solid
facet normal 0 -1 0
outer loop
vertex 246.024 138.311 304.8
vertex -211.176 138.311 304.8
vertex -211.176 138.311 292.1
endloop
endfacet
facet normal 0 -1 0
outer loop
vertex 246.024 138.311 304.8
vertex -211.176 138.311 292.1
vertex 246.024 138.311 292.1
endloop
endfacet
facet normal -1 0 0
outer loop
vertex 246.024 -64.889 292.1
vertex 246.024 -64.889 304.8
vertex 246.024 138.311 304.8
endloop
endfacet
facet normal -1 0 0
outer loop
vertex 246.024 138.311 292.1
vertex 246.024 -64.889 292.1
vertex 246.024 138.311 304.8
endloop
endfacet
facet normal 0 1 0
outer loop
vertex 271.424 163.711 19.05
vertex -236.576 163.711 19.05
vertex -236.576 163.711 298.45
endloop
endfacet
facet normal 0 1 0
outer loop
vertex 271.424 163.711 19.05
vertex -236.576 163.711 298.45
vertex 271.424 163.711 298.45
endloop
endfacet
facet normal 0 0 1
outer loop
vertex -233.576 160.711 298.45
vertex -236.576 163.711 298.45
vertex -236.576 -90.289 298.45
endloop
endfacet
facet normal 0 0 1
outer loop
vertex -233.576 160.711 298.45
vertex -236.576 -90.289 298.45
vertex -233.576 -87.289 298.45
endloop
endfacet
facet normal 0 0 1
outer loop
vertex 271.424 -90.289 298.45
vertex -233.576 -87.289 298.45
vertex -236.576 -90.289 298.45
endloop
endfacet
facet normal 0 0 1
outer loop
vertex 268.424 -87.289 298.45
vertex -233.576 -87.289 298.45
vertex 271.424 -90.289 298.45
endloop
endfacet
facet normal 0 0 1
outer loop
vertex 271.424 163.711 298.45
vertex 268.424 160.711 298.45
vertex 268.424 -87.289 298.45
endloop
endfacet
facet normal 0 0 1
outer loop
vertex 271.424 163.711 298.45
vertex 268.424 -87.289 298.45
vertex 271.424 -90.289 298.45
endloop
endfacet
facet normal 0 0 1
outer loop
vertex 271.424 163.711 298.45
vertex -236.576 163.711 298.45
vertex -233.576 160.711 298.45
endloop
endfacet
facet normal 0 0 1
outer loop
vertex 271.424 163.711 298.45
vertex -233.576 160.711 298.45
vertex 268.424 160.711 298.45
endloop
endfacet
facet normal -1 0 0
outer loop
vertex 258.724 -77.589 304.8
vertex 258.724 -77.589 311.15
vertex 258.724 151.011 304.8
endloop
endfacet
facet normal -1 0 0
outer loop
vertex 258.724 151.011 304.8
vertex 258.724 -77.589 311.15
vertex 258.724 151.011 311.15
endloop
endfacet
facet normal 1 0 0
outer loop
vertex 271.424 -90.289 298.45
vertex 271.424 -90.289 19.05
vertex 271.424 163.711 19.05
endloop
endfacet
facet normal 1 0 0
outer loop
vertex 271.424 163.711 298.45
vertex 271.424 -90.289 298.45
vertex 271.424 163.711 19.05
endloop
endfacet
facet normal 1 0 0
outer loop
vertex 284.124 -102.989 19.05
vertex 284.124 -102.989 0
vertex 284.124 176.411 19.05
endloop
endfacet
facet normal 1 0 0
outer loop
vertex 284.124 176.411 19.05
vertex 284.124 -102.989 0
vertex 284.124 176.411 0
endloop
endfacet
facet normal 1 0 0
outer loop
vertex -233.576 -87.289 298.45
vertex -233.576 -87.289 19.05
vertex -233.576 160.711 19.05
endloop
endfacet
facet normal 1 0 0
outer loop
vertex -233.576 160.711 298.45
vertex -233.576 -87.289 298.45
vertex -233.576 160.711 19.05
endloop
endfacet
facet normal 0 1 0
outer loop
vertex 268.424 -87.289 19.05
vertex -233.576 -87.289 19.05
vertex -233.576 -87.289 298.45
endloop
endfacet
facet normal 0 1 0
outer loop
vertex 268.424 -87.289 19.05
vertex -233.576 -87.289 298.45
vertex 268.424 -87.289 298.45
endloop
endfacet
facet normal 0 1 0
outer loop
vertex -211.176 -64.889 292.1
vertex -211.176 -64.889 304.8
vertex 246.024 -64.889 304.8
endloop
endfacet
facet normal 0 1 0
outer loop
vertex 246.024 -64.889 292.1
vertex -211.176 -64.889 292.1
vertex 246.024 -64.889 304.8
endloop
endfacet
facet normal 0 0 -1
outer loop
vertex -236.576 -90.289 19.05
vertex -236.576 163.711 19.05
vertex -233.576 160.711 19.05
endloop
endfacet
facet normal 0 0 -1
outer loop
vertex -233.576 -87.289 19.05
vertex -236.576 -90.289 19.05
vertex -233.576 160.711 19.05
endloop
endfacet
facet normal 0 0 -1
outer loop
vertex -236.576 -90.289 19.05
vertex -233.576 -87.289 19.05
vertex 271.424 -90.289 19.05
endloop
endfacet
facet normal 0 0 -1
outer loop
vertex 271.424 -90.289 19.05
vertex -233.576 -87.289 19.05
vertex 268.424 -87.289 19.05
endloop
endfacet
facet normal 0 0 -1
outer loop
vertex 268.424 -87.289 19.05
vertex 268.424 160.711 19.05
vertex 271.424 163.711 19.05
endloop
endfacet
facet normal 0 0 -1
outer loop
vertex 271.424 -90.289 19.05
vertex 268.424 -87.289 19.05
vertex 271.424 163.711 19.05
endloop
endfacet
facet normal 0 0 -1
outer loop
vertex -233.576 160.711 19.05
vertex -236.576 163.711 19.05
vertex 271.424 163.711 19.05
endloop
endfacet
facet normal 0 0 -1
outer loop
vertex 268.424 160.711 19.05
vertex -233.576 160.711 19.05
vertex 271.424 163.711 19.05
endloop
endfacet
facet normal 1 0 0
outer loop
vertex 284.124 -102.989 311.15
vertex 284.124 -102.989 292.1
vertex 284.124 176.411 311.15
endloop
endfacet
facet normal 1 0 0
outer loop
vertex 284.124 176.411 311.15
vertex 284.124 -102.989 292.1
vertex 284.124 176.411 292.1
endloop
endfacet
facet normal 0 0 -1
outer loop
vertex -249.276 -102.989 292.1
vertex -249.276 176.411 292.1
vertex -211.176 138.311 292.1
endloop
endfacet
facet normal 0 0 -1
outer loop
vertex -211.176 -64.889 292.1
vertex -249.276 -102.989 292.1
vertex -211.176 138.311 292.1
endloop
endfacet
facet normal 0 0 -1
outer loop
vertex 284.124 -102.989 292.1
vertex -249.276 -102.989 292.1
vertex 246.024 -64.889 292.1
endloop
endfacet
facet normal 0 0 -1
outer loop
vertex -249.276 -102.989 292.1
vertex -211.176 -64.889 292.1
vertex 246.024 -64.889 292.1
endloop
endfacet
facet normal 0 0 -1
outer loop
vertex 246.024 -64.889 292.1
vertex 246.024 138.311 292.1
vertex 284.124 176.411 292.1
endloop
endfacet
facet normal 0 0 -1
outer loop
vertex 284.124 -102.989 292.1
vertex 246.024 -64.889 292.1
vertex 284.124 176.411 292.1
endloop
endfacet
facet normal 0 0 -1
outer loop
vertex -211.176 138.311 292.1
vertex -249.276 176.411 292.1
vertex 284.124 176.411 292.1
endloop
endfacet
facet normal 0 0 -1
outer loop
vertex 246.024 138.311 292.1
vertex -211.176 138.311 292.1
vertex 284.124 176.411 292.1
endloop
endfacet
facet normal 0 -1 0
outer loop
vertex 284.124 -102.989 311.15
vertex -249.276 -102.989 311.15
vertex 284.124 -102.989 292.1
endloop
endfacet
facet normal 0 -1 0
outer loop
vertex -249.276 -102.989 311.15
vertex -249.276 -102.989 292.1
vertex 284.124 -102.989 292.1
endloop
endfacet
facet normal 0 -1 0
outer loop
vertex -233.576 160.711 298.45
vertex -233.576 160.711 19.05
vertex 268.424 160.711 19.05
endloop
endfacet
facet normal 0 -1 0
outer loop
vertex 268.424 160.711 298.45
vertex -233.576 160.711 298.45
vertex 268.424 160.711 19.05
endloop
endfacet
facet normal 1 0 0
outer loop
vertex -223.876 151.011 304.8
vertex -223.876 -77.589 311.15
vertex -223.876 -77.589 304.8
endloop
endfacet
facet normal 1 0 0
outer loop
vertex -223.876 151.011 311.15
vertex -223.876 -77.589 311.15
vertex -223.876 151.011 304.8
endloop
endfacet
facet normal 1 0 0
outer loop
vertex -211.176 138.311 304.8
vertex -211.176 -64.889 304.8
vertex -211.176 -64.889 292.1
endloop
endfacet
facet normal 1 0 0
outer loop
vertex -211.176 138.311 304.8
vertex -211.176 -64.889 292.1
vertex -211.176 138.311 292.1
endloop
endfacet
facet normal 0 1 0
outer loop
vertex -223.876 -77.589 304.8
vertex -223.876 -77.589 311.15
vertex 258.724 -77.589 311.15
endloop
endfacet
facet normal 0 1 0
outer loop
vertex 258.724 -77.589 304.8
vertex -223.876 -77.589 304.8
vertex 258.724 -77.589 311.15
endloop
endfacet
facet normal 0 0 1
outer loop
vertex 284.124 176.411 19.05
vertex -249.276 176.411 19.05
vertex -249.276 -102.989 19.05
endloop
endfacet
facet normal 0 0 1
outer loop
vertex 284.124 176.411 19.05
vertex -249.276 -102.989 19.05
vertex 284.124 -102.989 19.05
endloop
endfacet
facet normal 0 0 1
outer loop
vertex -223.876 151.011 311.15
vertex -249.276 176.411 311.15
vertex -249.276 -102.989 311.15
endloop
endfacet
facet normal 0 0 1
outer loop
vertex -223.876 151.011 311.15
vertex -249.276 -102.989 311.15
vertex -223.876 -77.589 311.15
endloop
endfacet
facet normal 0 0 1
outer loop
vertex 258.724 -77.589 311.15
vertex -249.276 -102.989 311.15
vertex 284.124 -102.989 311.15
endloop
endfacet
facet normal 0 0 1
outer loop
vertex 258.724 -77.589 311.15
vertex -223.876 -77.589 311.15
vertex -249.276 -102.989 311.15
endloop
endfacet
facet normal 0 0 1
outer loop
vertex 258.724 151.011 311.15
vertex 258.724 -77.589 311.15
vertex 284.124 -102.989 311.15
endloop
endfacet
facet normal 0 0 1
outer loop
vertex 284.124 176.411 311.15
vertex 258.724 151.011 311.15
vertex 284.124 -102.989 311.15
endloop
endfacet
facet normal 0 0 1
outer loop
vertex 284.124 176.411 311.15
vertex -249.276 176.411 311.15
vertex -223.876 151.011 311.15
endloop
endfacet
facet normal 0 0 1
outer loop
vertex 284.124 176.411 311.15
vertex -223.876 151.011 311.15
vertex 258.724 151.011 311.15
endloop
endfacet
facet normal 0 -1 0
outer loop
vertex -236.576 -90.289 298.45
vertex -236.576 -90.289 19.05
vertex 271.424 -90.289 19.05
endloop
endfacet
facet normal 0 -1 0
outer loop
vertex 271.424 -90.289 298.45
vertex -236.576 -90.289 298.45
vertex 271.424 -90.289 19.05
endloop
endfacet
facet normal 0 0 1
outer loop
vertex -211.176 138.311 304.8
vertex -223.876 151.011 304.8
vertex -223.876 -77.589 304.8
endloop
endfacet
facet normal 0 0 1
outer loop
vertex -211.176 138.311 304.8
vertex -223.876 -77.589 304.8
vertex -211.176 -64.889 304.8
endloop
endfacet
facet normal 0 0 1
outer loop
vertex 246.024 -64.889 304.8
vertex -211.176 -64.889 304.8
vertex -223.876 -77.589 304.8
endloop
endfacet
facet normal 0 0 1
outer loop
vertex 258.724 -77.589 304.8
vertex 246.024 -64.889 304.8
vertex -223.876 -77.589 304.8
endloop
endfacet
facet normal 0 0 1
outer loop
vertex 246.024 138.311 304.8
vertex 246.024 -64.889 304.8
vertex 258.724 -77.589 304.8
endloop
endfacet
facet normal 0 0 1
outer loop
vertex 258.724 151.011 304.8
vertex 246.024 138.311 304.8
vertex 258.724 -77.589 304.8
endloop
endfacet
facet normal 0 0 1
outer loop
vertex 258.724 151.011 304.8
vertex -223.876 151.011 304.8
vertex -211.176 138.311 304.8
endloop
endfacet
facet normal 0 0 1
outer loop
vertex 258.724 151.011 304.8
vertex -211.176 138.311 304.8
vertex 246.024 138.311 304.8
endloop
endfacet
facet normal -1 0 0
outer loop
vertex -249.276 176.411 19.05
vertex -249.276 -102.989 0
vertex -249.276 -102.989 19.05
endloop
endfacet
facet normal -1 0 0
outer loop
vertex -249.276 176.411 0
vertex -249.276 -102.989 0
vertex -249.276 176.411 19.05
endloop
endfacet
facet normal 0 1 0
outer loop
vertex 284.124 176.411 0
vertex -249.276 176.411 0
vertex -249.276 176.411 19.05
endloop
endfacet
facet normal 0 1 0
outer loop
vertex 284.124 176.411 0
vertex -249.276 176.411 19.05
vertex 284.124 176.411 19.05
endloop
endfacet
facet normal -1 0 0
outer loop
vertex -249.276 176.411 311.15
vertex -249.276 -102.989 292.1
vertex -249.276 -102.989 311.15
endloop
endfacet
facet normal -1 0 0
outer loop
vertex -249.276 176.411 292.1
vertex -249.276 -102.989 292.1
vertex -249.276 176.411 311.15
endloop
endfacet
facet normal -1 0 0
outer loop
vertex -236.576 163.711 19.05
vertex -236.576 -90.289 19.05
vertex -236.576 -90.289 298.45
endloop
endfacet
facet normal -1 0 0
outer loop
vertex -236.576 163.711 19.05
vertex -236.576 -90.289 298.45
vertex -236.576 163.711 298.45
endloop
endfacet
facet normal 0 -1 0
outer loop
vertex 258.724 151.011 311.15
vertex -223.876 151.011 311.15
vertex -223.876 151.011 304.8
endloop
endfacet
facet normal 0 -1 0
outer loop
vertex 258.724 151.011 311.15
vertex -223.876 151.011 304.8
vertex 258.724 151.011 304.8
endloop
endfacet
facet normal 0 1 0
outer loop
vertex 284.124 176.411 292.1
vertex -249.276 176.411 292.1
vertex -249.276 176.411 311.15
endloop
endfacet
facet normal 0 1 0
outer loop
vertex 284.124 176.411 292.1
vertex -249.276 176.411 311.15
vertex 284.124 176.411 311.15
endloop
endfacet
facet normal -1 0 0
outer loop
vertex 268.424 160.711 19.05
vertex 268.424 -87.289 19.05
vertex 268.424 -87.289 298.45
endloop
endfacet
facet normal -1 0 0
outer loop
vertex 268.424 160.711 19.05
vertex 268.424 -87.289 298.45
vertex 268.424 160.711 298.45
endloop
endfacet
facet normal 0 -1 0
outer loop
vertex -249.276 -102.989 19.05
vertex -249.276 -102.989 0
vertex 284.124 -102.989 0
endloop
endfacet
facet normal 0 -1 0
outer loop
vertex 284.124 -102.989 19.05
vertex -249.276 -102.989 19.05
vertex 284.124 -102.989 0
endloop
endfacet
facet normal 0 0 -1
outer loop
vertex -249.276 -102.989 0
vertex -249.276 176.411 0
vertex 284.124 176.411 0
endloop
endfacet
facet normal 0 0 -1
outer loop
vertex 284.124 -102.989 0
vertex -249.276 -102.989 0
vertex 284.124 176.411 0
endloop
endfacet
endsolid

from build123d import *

# Parameters (mm, degrees)
F0_W      = 533.4
F0_H      = 279.4
F1_DEPTH  = 19.05
F2_W      = 508
F2_H      = 254
F2_W_2    = 502
F2_H_2    = 248
F3_DEPTH  = 279.4
F4_W      = 533.4
F4_H      = 279.4
F5_DEPTH  = 6.35
F6_W      = 533.4
F6_H      = 279.4
F7_DEPTH  = 6.35
F8_W      = 482.6
F8_H      = 228.6
F9_DEPTH  = 6.35
F10_W     = 457.2
F10_H     = 203.2
F11_DEPTH = 25.4


with BuildPart() as f1:
    # F0 (on Top) → F1 (new body)
    with BuildSketch(Plane.XY):
        with Locations((17.4243982553, 36.711462517)):
            Rectangle(F0_W, F0_H)
    extrude(amount=F1_DEPTH)


with BuildPart() as f3:
    # F2 (on face) → F3 (new body)
    with BuildSketch(Plane.XY.offset(19.05)):
        with Locations((17.4243982553, 36.711462517)):
            Rectangle(F2_W, F2_H)
        with Locations((17.4243982553, 36.711462517)):
            Rectangle(F2_W_2, F2_H_2, mode=Mode.SUBTRACT)
    extrude(amount=F3_DEPTH)


with BuildPart() as f5:
    # F4 (on face) → F5 (new body, symmetric)
    with BuildSketch(Plane.XY.offset(298.45)):
        with Locations((17.4243982553, 36.711462517)):
            Rectangle(F4_W, F4_H)
    extrude(amount=F5_DEPTH, both=True)

    # F6 (on face) → F7 (join)
    with BuildSketch(Plane.XY.offset(304.8)):
        with Locations((17.4243982553, 36.711462517)):
            Rectangle(F6_W, F6_H)
    extrude(amount=F7_DEPTH)

    # F8 (on face) → F9 (cut)
    with BuildSketch(Plane.XY.offset(311.15)):
        with Locations((17.4243982553, 36.711462517)):
            Rectangle(F8_W, F8_H)
    extrude(amount=-F9_DEPTH, mode=Mode.SUBTRACT)

    # F10 (on face) → F11 (cut)
    with BuildSketch(Plane.XY.offset(304.8)):
        with Locations((17.4243982553, 36.711462517)):
            Rectangle(F10_W, F10_H)
    extrude(amount=-F11_DEPTH, mode=Mode.SUBTRACT)


solid = Compound([f1.part, f3.part, f5.part])
